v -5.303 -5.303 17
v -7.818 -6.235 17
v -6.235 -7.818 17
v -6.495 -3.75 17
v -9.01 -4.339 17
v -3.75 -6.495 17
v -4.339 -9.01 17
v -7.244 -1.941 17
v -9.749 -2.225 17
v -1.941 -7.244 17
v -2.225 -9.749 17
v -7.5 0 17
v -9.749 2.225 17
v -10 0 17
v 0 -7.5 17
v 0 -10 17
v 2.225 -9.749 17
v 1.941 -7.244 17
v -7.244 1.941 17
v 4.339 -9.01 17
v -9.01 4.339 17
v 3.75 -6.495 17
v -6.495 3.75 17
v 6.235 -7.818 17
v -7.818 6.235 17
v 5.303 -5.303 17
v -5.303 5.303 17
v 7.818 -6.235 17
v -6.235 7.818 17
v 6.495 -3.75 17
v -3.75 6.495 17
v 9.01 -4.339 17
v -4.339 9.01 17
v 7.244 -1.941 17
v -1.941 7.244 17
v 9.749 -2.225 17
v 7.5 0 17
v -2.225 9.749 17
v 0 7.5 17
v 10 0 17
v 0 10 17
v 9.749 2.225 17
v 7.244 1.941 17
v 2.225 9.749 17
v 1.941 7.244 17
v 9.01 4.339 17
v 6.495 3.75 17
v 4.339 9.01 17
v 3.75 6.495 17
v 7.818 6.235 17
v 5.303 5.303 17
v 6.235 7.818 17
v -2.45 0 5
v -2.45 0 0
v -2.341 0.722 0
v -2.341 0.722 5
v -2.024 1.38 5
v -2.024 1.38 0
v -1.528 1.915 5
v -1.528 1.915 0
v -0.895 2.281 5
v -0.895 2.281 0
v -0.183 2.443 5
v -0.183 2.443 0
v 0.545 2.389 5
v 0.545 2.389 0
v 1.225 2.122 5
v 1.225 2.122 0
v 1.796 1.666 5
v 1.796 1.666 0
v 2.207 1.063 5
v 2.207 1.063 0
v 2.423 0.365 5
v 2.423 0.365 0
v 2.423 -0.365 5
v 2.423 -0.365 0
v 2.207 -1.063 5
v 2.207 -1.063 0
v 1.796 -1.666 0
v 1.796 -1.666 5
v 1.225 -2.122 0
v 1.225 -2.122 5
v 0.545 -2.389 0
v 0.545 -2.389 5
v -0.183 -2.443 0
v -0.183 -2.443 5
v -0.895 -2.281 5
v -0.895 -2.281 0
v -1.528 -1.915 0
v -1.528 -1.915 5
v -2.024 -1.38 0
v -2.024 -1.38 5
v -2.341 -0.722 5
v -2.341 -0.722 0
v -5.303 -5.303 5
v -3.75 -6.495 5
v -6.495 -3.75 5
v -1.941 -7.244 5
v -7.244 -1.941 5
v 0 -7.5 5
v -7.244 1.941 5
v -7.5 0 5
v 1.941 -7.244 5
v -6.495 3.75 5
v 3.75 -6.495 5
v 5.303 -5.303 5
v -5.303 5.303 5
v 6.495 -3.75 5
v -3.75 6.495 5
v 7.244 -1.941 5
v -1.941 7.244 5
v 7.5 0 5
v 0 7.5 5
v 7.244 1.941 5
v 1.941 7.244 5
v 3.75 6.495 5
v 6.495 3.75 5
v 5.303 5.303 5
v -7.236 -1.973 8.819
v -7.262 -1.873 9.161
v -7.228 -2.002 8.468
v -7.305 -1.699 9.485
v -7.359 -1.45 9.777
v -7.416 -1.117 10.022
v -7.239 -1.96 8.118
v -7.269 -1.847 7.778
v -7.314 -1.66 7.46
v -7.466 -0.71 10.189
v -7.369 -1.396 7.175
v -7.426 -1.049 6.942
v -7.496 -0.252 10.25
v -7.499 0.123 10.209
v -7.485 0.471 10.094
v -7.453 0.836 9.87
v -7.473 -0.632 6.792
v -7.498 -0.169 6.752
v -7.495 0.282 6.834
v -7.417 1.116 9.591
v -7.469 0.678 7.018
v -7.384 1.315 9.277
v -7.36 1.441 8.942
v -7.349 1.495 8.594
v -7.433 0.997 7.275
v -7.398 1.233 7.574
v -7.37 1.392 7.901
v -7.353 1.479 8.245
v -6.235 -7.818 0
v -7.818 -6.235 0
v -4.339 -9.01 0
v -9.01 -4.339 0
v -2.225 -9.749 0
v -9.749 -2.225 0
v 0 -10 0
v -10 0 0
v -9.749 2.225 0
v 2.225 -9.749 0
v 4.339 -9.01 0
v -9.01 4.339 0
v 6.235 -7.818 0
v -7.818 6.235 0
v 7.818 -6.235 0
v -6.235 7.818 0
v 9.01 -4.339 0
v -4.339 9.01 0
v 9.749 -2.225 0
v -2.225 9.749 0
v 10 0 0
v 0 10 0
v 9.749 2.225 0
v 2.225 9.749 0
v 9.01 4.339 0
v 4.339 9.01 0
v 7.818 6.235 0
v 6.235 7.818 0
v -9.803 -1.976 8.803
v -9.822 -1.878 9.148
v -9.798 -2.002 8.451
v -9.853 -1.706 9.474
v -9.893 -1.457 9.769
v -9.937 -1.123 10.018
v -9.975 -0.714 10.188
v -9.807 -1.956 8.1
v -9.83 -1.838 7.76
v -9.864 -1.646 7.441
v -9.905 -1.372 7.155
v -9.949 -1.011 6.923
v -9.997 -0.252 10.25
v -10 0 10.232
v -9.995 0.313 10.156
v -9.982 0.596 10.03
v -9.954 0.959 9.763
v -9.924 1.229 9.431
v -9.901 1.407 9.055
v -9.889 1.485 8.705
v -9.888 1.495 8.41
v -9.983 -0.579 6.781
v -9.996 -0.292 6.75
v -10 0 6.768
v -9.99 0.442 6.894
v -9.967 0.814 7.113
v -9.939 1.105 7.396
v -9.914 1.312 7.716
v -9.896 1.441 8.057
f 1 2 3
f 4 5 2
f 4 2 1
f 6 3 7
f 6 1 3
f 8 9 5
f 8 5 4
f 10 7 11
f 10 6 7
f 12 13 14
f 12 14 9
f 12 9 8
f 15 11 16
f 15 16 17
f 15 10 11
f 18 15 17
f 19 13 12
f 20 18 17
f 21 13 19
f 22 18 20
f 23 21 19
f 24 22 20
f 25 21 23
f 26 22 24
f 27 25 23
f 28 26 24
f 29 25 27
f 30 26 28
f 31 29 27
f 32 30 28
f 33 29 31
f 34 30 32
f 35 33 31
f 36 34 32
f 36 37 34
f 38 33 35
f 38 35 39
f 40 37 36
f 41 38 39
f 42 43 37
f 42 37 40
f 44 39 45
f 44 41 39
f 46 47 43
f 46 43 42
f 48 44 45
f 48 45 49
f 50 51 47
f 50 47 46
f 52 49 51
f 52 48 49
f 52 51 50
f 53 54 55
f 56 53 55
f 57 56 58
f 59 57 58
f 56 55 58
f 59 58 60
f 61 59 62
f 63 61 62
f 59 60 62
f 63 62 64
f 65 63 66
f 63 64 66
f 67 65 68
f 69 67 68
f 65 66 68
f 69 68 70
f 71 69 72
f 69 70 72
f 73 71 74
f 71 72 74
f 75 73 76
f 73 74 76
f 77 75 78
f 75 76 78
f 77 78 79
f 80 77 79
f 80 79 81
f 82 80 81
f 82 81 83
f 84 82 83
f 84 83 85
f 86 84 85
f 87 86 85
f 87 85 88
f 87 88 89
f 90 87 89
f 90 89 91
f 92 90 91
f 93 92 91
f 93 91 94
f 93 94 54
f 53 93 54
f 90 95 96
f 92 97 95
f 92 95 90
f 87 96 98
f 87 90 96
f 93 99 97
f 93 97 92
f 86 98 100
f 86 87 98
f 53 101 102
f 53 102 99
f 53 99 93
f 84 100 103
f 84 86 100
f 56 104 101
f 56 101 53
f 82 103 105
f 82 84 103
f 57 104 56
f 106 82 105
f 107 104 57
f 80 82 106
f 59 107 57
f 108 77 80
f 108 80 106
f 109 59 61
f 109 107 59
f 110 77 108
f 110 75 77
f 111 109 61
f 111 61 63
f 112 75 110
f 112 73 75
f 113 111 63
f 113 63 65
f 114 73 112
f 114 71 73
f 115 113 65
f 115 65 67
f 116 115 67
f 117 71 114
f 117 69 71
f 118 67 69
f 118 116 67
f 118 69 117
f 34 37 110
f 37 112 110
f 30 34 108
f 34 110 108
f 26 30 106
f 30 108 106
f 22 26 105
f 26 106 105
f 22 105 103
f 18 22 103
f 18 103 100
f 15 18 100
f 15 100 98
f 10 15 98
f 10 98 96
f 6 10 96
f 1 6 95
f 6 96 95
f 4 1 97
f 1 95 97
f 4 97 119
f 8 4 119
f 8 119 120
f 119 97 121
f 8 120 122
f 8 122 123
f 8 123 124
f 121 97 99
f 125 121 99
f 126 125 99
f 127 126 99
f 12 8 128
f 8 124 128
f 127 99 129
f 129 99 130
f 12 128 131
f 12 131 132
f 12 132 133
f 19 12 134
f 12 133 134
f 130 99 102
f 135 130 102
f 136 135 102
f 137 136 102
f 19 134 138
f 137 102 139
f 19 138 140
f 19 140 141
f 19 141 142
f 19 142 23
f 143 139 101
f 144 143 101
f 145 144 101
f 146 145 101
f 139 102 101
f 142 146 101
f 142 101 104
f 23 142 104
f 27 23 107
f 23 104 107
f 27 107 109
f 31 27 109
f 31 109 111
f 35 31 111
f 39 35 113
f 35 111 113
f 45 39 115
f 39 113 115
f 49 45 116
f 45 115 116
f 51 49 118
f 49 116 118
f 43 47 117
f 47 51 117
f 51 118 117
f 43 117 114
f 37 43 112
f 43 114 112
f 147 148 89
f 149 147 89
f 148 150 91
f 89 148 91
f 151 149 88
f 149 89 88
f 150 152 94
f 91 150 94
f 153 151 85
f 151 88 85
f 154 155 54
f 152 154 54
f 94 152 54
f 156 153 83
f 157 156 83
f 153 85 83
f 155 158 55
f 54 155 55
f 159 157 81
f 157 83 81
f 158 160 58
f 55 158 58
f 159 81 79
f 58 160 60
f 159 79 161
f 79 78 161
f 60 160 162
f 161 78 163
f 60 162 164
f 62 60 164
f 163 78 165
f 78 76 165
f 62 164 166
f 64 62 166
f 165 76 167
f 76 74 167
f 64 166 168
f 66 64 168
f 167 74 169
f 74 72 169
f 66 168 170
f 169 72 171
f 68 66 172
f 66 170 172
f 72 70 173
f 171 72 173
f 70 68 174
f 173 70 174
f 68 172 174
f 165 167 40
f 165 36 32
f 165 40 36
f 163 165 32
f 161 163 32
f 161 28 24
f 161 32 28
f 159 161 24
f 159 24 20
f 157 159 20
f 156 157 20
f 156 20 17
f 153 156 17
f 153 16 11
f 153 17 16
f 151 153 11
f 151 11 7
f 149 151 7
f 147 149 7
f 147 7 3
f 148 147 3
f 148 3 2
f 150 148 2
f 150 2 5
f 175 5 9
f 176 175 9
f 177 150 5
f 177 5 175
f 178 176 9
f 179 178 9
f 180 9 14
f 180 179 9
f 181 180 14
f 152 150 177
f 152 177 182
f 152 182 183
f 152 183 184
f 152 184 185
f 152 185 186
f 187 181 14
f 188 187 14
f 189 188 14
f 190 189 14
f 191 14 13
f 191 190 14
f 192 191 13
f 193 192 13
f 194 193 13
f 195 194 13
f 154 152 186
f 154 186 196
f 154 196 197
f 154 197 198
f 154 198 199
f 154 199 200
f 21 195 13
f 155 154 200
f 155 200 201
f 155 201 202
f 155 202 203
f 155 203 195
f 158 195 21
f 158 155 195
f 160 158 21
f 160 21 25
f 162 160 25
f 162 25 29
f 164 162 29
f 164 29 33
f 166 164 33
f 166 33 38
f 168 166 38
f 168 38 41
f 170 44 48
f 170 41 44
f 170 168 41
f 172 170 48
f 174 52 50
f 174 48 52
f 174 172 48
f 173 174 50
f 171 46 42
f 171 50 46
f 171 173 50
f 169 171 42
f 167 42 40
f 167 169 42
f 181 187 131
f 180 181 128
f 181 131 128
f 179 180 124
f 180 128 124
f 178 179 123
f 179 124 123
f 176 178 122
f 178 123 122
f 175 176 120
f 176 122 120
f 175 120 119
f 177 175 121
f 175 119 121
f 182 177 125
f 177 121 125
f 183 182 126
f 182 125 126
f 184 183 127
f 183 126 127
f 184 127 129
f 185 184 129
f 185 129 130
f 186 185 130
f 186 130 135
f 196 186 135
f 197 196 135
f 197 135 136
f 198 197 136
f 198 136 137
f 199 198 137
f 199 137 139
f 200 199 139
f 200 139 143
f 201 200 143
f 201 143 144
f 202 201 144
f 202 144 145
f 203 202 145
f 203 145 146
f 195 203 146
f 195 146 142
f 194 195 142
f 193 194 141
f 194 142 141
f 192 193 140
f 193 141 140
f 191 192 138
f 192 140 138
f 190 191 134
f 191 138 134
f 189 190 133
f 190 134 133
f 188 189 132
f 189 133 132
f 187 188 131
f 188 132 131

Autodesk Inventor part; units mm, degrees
ref_plane "XZ Plane" through (0, 0, 0) normal (0, 1, 0) x (-1, 0, 0)
ref_plane "XY Plane" through (0, 0, 0) normal (0, 0, 1) x (1, 0, 0)
sketch "Skizze1" plane through (0, 0, 0) normal (0, 0, 1) x (1, 0, 0)
  circle A0 centre (0, 0) radius 10
  dimension "d0" = 20
extrude "Extrusion1" add sketch "Skizze1" along normal blind 5
sketch "Skizze2" plane through (0, 0, 5) normal (0, 0, 1) x (1, 0, 0)
  circle A0 centre (0, 0) radius 7.5
  circle A1 centre (0, 0) radius 10
  dimension "d3" = 15
extrude "Extrusion2" add sketch "Skizze2" along normal blind 14
sketch "Skizze3" plane through (0, 0, 0) normal (0, 0, -1) x (-1, 0, 0)
  circle A0 centre (0, 0) radius 2.45
  dimension "d6" = 4.9
extrude "Extrusion3" cut sketch "Skizze3" against normal blind 5
ref_plane "Arbeitsebene1" through (-10, 0, 0) normal (1, 0, 0) x (0, 1, 0)
sketch "Skizze7" plane through (0, 0, 19) normal (0, 0, 1) x (1, 0, 0)
  circle A0 centre (0, 0) radius 7.5
  circle A1 centre (0, 0) radius 10
extrude "Extrusion6" cut sketch "Skizze7" against normal blind 2
sketch "Skizze9" plane through (-10, 0, 0) normal (1, 0, 0) x (0, 1, 0)
  line L0 (-10, 17) -> (10, 17) projected
  line L1 (-0.2525, 8.5) -> (9.7475, 8.5)
  line L2 (-0.2525, 8.5) -> (-10.2525, 8.5)
  point P0 (0, 0)
  dimension "d36" = 8.5
hole "Bohrung3" at (-10, -0.2525, 8.5) direction (1, 0, 0) diameter 3.5 depth 8 tip angle 118
properties part number "2.2 Fuß"
